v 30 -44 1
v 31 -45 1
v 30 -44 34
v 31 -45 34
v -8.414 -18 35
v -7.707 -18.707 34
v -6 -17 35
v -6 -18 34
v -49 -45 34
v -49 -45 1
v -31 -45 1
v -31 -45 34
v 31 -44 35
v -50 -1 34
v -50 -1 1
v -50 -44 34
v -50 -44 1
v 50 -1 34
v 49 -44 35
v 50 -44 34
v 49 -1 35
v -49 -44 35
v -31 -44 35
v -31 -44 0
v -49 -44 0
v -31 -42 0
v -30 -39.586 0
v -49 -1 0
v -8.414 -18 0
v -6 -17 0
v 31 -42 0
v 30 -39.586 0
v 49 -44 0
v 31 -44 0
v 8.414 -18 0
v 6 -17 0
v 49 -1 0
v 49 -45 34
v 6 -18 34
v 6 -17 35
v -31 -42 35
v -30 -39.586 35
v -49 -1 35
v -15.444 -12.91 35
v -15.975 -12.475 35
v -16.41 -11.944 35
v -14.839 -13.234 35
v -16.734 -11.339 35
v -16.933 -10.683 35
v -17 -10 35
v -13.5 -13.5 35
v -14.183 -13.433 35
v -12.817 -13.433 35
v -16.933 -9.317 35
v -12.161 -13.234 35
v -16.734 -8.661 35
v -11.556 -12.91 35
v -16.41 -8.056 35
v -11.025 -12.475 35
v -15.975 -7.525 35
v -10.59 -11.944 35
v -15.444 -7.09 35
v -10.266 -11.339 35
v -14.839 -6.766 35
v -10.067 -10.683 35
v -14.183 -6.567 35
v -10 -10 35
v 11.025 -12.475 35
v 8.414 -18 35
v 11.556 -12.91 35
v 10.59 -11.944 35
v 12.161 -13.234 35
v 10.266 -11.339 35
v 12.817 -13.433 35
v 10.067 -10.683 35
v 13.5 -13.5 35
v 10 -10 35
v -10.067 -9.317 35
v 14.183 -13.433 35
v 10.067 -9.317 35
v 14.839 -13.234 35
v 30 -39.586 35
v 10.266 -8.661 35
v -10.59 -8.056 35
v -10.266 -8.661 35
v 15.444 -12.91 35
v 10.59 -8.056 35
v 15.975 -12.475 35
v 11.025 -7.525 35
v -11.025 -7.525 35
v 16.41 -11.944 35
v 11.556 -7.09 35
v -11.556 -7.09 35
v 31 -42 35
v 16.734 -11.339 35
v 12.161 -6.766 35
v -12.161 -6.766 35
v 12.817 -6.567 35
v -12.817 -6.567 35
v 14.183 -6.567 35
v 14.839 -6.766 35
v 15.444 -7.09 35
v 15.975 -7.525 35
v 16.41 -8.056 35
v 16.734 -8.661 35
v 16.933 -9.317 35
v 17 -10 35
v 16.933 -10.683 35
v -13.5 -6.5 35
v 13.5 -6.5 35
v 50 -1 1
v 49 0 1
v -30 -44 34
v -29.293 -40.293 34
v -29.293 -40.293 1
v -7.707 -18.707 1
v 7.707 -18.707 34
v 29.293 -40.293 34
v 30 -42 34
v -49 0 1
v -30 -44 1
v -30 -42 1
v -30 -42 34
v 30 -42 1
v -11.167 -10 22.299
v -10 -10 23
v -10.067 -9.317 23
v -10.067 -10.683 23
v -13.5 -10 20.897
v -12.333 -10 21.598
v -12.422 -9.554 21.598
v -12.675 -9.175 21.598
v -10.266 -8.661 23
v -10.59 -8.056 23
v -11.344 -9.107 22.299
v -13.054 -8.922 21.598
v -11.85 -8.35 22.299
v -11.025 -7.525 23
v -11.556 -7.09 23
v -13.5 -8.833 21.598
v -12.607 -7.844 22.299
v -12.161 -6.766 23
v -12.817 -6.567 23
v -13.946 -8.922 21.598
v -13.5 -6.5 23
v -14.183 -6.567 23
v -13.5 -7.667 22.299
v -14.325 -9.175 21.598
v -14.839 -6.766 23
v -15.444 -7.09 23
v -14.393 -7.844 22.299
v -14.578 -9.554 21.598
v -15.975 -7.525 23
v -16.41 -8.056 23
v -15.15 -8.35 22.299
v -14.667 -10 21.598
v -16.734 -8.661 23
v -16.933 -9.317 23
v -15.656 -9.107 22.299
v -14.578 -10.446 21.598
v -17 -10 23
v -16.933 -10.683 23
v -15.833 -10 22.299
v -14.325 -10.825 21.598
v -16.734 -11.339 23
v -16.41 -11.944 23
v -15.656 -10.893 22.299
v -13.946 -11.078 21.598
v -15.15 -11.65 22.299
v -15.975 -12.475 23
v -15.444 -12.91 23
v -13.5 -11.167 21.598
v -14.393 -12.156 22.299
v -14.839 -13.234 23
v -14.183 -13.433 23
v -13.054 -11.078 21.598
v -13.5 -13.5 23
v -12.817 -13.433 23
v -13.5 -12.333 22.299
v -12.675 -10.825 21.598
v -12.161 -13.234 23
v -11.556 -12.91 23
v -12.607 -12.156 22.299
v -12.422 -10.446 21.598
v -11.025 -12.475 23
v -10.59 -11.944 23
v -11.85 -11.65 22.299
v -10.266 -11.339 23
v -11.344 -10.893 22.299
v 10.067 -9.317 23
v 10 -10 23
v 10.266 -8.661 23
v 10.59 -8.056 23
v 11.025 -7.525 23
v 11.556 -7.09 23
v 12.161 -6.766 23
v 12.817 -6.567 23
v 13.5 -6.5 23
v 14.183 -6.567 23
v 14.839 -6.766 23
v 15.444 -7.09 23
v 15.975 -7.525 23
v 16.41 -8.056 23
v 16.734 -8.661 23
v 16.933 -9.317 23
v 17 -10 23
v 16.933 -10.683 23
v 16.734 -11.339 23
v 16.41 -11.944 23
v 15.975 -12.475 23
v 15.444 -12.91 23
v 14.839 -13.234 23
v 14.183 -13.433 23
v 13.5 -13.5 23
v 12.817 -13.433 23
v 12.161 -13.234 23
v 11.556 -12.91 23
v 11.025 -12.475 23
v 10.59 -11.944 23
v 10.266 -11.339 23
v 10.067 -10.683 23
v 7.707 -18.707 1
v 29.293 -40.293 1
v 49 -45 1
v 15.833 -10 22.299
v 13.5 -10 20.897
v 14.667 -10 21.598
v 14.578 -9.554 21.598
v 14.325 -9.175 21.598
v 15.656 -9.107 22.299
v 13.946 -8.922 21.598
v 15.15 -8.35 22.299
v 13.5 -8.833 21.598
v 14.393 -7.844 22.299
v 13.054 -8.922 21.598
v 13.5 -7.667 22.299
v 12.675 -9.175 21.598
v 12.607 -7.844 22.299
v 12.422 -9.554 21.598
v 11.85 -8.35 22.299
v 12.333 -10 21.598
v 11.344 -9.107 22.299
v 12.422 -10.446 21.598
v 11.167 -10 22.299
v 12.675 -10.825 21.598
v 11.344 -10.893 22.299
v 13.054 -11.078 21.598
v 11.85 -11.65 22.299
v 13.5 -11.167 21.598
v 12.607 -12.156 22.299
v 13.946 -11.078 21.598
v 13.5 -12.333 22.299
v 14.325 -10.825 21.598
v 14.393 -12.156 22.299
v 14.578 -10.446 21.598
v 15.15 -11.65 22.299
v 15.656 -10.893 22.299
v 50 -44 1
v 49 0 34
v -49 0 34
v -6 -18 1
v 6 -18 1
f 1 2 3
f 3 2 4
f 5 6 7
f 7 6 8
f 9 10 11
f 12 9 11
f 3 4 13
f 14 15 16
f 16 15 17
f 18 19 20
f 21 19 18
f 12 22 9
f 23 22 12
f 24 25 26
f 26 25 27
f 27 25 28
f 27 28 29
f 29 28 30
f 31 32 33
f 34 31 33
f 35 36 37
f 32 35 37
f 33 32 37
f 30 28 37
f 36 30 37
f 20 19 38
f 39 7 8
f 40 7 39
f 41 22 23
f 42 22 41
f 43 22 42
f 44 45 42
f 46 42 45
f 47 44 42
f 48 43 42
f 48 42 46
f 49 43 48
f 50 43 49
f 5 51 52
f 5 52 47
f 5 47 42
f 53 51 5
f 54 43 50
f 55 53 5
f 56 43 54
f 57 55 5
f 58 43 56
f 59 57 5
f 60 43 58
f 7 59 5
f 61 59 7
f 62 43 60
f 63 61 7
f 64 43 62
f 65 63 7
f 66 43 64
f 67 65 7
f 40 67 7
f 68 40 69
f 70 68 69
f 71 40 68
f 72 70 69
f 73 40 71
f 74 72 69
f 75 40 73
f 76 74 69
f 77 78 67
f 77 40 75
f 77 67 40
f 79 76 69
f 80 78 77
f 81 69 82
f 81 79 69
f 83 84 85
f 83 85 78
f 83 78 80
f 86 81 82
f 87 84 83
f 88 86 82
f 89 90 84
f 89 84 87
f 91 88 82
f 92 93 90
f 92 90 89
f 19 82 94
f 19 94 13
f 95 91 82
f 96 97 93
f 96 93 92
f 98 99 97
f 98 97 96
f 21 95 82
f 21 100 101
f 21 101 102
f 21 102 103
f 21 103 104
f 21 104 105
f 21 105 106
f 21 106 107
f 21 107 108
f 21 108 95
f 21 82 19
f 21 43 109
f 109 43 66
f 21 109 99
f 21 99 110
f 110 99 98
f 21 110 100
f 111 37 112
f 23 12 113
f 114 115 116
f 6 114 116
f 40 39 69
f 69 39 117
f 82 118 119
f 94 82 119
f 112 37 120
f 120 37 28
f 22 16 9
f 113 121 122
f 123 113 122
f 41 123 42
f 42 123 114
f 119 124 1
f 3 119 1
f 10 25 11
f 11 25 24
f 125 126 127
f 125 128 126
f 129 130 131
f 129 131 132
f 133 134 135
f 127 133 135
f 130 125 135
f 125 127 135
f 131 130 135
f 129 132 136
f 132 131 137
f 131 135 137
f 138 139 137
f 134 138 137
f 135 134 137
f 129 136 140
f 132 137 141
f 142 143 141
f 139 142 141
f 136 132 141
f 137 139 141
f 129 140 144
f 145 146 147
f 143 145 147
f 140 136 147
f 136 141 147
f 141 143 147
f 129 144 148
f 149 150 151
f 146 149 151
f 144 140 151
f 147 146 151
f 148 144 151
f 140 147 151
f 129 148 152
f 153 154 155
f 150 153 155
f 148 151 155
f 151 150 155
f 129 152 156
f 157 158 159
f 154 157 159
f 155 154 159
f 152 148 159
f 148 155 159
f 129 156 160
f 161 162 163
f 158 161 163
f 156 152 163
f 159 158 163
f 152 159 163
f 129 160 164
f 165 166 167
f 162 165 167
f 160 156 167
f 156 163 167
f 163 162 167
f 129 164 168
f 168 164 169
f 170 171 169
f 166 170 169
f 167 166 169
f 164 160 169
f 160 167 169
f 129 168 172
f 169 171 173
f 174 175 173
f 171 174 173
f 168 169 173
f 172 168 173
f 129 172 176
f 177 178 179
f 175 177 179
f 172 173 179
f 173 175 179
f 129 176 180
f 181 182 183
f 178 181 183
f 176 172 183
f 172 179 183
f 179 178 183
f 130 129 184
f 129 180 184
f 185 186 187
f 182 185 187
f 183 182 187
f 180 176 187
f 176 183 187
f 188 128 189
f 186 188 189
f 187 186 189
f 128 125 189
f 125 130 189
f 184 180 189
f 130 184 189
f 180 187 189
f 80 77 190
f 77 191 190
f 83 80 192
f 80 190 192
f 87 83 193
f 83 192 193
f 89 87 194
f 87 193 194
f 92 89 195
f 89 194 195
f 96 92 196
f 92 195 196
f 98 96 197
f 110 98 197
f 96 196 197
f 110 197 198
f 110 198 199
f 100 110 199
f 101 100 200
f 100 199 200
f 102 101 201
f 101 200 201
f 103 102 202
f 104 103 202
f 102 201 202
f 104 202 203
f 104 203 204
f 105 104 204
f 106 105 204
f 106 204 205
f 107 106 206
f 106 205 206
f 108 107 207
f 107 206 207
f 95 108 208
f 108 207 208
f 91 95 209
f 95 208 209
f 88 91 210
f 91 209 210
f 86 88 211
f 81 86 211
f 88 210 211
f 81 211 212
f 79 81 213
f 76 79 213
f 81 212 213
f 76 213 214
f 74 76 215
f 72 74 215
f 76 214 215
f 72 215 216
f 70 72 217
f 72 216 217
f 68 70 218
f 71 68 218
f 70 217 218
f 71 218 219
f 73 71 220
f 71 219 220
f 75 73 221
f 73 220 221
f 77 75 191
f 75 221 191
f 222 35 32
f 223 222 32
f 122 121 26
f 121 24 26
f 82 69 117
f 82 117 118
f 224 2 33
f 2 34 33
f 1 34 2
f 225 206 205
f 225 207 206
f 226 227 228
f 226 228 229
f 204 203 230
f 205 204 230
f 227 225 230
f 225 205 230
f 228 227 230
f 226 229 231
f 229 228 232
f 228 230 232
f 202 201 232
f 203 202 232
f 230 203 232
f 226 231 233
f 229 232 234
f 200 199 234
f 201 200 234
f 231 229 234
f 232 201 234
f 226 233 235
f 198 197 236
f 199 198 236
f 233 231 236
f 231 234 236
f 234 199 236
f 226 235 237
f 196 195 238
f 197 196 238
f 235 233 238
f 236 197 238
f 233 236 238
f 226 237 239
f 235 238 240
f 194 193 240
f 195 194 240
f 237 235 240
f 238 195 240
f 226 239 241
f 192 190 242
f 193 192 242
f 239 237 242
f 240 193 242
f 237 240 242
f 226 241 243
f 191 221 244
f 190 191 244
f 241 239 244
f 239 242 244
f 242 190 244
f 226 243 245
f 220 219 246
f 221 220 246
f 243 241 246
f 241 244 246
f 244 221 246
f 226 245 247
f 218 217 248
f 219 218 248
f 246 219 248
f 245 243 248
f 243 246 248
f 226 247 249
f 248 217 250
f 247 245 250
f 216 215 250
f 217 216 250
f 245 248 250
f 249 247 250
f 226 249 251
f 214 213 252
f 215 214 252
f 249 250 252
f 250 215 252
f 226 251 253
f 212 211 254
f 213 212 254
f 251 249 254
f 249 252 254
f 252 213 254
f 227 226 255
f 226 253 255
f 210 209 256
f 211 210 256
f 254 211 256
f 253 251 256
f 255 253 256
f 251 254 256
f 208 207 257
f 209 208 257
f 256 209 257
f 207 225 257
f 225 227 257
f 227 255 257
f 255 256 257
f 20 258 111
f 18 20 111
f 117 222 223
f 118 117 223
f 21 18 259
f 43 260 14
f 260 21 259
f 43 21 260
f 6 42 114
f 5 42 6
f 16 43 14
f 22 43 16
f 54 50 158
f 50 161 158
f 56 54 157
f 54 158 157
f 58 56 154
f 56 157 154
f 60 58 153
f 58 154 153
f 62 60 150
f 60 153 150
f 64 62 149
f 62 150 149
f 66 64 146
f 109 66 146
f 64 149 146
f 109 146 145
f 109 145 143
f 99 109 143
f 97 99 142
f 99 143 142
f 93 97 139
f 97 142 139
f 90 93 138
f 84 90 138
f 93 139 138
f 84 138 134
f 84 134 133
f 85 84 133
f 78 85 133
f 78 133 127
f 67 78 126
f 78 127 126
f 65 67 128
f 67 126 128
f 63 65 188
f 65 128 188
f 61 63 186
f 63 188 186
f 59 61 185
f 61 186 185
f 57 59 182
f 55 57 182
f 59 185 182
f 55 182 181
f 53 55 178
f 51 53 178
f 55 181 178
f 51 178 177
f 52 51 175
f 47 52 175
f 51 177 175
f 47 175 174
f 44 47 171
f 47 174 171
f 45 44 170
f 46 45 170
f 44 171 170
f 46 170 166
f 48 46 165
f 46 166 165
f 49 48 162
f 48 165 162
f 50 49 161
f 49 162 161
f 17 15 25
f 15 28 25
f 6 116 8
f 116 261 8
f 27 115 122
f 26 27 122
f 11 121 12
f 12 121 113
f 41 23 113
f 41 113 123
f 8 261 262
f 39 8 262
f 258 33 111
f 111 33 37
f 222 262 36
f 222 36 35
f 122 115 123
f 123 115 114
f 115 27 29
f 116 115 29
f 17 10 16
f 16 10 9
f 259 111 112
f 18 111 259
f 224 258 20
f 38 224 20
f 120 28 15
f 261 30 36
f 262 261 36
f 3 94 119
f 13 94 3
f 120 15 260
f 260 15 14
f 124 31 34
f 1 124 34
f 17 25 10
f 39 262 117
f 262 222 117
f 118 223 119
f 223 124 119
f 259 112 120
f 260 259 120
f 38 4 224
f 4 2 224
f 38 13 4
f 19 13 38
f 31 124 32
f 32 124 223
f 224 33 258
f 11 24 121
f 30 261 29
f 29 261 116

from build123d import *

# Parameters (mm, degrees)
BOSS_EXTRUDE1_DEPTH          = 35
CHAMFER1_SIZE                = 1
F_7_0_7_DIAMETER_HOLE1_D     = 7
F_7_0_7_DIAMETER_HOLE1_DEPTH = 12
F_7_0_7_DIAMETER_HOLE1_TIP   = 2.103012167


with BuildPart() as part:
    # Sketch1 → Boss-Extrude1 (new body)
    with BuildSketch(Plane.XY):
        Polygon((50, 0), (-50, 0), (-50, -45), (-30, -45), (-30, -41), (-7, -18), (7, -18), (30, -41), (30, -45), (50, -45), align=None)
    extrude(amount=BOSS_EXTRUDE1_DEPTH)

    # Chamfer1
    chamfer1_edges = [part.edges().sort_by_distance(p)[0] for p in [
        (0, -18, 0),
        (-18.5, -29.5, 0),
        (-30, -43, 0),
        (-40, -45, 0),
        (-50, -22.5, 0),
        (0, 0, 0),
        (50, -22.5, 0),
        (40, -45, 35),
        (40, -45, 0),
        (30, -43, 0),
        (18.5, -29.5, 0),
        (50, -22.5, 35),
        (7, -18, 17.5),
        (-7, -18, 17.5),
        (-30, -41, 17.5),
        (-30, -45, 17.5),
        (-50, -45, 17.5),
        (-50, 0, 17.5),
        (50, 0, 17.5),
        (50, -45, 17.5),
        (30, -45, 17.5),
        (30, -41, 17.5),
        (0, 0, 35),
        (-50, -22.5, 35),
        (-40, -45, 35),
        (-30, -43, 35),
        (-18.5, -29.5, 35),
        (0, -18, 35),
        (18.5, -29.5, 35),
        (30, -43, 35),
    ]]
    chamfer(chamfer1_edges, length=CHAMFER1_SIZE)

    # Ø7.0 (7) Diameter Hole1
    with Locations(Plane.XY.offset(35)):
        with Locations((-13.5, -10), (13.5, -10)):
            Hole(F_7_0_7_DIAMETER_HOLE1_D / 2, depth=F_7_0_7_DIAMETER_HOLE1_DEPTH)
            with Locations((0, 0, -(F_7_0_7_DIAMETER_HOLE1_DEPTH + F_7_0_7_DIAMETER_HOLE1_TIP / 2))):  # 118° drill point
                Cone(0, F_7_0_7_DIAMETER_HOLE1_D / 2, F_7_0_7_DIAMETER_HOLE1_TIP, mode=Mode.SUBTRACT)


solid = part.part
